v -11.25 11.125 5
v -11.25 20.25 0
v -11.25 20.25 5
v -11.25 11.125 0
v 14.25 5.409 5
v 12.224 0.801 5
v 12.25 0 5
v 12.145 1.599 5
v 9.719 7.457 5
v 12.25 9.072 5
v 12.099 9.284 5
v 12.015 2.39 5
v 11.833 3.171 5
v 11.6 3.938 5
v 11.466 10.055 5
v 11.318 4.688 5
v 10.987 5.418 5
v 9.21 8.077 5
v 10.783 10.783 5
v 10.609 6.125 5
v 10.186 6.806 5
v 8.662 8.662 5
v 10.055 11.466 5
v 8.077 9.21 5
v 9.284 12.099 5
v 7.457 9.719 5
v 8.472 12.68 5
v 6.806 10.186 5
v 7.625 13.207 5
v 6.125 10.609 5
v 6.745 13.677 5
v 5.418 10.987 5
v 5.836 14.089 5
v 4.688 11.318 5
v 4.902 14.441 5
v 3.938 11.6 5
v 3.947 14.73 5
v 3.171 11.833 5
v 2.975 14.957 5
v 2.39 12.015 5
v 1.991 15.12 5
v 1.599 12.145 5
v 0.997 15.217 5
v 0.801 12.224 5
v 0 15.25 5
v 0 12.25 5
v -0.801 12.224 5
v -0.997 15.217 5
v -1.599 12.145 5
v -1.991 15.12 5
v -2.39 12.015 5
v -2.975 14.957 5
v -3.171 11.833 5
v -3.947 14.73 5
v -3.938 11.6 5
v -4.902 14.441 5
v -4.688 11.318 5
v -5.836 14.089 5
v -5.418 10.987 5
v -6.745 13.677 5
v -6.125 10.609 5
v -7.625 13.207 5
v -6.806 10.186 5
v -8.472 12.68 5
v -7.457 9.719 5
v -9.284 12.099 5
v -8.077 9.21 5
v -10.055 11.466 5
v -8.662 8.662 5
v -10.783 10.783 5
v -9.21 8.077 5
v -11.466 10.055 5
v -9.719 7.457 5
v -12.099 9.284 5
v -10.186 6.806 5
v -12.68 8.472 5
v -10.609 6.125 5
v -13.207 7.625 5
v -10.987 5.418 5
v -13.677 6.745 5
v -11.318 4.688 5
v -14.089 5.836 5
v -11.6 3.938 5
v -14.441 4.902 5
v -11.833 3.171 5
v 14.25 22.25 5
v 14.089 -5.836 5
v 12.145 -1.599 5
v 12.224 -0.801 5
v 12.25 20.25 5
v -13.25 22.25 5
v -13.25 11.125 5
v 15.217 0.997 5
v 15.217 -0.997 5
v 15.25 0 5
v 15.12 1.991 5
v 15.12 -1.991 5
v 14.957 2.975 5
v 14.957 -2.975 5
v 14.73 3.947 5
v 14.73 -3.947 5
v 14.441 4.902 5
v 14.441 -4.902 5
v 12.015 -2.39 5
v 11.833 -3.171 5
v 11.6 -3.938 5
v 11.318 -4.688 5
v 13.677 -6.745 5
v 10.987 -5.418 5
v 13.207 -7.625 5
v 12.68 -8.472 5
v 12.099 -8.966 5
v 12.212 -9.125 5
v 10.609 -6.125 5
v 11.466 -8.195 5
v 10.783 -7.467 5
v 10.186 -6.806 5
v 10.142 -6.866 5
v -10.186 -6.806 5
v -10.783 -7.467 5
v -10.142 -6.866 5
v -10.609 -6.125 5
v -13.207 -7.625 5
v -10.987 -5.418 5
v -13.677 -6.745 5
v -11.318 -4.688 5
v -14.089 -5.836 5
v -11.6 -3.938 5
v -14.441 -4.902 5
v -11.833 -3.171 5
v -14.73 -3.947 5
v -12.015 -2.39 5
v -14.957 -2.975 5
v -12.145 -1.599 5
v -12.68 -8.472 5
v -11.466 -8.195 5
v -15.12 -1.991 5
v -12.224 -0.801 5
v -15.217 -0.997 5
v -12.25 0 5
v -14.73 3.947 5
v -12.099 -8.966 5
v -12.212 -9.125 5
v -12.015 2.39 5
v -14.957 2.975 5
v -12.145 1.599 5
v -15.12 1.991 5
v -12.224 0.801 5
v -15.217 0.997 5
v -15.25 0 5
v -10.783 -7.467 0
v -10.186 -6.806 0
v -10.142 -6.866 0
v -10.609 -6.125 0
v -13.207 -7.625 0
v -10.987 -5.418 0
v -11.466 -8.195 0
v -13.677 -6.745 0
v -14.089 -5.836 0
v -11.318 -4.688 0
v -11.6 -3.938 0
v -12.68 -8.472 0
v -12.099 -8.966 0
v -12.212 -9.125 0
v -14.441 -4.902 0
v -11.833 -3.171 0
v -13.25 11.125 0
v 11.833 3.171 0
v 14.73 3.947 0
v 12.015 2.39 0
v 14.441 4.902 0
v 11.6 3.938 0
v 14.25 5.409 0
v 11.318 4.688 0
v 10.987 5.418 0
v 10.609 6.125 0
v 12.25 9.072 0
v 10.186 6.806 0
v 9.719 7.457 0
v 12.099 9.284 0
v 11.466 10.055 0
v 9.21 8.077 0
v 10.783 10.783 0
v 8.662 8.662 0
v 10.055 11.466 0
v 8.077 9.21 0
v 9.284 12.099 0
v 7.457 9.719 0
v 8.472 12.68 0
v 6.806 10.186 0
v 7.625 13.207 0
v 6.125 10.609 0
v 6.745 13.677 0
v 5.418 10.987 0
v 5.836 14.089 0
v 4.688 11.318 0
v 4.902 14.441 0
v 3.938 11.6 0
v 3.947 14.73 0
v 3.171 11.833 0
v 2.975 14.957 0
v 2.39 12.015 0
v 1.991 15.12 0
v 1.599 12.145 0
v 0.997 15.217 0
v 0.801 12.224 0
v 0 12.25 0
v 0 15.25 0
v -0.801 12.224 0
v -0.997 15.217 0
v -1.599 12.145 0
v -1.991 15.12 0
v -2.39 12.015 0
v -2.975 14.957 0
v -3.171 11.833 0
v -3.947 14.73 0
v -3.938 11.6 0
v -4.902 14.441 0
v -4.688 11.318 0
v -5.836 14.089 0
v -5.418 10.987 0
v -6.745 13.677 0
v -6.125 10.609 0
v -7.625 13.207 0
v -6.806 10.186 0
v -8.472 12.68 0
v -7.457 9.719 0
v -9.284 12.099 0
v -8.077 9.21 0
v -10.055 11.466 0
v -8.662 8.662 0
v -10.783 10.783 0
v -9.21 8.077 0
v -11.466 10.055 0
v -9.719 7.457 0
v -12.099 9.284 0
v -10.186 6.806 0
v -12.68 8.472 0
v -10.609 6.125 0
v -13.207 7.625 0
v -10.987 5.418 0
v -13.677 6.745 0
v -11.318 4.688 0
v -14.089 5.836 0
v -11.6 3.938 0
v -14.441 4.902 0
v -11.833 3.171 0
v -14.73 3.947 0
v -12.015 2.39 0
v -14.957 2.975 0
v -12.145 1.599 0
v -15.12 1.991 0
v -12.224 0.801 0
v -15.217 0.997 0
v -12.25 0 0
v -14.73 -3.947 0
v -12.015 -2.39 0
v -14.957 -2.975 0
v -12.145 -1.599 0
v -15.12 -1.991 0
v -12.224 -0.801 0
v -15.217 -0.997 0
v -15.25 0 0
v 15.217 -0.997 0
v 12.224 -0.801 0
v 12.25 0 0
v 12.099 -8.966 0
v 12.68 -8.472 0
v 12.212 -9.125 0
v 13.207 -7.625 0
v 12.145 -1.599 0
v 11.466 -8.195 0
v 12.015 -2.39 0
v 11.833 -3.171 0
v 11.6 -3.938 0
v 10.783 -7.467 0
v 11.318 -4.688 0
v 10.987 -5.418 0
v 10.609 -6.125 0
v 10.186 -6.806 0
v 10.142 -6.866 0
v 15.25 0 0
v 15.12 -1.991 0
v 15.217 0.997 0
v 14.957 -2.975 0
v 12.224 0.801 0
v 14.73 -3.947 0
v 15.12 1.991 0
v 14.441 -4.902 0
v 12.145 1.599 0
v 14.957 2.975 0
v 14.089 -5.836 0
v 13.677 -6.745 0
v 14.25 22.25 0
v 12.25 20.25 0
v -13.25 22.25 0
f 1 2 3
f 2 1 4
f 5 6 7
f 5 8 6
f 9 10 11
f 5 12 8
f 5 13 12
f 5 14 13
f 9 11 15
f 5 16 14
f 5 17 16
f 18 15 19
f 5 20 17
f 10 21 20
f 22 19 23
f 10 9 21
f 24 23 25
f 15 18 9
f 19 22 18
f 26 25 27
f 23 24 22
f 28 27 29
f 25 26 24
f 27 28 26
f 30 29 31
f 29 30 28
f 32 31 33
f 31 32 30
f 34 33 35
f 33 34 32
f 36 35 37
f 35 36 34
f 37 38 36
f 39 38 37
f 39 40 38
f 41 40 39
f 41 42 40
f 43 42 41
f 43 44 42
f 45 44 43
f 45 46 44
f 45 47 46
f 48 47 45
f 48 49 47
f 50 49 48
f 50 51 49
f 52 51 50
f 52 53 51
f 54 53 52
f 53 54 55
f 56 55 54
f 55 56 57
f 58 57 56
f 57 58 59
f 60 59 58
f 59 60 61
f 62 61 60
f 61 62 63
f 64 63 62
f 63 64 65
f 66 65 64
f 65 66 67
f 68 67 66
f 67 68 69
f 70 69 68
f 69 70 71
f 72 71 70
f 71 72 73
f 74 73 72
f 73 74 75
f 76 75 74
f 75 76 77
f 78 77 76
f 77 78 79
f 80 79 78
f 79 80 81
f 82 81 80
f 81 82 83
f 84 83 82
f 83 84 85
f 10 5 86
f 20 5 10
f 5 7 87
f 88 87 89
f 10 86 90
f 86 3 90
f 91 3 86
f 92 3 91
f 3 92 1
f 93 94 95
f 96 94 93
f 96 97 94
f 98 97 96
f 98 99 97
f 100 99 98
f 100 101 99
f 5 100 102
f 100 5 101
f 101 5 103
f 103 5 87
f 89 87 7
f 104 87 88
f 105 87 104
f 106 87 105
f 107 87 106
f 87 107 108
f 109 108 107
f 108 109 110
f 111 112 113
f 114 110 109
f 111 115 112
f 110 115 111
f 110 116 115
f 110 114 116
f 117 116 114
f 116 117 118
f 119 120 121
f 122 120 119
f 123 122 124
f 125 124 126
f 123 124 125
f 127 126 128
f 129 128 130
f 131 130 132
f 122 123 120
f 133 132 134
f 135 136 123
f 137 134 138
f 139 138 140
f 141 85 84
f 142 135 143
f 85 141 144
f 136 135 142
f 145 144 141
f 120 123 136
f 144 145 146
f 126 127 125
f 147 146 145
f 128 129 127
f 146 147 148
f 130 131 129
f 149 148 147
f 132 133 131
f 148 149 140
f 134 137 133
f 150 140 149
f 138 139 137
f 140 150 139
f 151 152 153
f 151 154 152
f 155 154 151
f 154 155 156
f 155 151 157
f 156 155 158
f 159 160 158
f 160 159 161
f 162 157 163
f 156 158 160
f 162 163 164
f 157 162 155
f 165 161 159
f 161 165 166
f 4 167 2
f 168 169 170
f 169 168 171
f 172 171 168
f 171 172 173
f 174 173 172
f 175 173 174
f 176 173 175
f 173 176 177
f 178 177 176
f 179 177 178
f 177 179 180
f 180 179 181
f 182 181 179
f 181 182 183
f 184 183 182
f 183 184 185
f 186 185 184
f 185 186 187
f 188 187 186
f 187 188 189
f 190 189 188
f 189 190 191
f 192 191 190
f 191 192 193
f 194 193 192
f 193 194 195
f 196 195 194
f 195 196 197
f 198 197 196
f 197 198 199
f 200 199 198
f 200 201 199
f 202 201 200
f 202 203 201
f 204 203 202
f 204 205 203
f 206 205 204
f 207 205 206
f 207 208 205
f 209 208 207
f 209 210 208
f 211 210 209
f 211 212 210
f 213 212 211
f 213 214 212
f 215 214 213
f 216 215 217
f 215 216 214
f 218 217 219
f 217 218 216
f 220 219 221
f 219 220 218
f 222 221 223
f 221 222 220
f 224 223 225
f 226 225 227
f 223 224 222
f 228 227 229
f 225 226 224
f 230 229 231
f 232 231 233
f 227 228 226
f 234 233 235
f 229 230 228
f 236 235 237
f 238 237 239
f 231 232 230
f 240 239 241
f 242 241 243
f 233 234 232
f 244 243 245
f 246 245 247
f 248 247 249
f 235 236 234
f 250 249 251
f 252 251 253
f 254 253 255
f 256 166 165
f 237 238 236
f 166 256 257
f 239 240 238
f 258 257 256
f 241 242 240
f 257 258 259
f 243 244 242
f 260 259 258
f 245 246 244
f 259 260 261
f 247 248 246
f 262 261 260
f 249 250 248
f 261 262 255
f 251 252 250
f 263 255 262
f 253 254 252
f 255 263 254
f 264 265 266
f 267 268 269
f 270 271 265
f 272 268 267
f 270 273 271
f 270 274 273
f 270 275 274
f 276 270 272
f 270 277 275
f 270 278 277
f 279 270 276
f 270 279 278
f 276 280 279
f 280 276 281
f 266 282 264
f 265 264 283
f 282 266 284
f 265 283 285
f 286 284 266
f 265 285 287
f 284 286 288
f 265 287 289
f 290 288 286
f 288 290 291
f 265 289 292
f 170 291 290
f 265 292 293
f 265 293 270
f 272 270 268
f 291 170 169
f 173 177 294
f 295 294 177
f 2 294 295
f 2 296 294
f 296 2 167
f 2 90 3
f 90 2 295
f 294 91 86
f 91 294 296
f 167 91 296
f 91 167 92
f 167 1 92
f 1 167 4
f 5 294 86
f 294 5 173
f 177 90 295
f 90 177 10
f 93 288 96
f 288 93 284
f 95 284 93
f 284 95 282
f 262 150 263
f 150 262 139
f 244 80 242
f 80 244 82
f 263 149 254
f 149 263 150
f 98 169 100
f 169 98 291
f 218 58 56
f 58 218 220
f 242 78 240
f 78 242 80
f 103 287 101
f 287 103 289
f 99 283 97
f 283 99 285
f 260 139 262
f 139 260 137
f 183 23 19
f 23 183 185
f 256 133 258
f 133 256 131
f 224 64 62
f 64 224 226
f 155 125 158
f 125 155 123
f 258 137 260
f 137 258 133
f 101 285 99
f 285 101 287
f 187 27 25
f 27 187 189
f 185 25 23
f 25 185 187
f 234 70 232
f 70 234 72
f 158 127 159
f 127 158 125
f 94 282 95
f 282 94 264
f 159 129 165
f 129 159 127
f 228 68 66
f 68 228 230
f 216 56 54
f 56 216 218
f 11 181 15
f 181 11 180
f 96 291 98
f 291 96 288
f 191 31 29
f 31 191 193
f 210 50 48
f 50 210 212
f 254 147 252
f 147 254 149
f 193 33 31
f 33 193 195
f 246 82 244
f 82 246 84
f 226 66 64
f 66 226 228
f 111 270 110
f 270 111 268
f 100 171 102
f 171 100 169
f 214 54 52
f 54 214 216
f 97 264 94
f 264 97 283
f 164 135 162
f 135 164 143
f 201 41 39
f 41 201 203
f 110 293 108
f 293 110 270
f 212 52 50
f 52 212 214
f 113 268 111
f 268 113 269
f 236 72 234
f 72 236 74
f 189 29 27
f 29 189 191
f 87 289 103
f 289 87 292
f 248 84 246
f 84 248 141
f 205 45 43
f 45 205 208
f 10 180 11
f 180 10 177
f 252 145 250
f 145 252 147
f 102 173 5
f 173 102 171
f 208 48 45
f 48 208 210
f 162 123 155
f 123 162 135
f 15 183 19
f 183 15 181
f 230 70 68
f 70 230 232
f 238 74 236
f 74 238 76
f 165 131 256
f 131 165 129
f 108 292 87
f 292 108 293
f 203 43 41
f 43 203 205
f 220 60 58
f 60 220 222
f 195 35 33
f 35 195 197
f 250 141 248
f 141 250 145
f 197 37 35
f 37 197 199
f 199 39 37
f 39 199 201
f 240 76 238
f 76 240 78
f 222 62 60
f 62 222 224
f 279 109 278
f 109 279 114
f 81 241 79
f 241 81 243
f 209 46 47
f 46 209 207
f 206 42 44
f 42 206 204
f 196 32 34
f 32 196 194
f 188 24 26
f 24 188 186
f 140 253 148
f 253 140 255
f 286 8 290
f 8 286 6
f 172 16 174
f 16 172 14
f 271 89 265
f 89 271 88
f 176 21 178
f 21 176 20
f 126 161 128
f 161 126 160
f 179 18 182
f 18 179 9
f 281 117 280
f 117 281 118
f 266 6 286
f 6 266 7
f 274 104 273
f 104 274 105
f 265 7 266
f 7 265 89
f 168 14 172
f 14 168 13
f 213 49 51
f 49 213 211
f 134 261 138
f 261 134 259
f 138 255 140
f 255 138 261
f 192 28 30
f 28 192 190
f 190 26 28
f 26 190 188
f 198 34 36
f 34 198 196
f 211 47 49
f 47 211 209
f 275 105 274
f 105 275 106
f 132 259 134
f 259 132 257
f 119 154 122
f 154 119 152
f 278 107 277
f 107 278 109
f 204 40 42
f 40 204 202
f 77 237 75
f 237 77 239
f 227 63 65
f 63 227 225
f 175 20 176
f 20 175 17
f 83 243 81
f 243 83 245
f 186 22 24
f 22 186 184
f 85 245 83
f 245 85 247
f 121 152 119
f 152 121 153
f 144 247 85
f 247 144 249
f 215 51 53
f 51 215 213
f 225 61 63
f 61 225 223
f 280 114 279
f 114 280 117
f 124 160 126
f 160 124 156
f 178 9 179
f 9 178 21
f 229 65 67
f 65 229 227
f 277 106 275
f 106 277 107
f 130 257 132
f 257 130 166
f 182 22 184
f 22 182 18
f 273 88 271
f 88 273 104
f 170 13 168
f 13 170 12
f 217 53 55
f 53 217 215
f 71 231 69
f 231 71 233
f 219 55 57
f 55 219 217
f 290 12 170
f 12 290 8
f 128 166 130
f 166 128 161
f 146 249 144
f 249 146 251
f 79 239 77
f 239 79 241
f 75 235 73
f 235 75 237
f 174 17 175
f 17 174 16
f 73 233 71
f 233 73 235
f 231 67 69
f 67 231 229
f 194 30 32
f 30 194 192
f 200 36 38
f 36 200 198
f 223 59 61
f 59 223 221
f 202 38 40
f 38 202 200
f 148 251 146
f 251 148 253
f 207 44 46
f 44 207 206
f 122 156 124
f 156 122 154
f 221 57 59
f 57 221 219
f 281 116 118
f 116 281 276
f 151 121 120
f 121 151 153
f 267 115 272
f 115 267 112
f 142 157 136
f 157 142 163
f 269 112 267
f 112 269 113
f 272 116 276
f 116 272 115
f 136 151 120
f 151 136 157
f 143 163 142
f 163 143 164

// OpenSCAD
pole_dia = 24.5;
pole_r = pole_dia/2;
pole_thick = 3;
pole_h = 5;
clip_depth = 10;
clip_thick = 2;

$fn = 96;

clip_depth2 = clip_depth + pole_r;

difference (){

  union(){
    translate([pole_r, 0, 0]){
      cube([clip_thick, clip_depth2, pole_h]);
      
      translate([0+1, clip_depth2, 0]){
        rotate(a=180, v=[0,0,1]){
          cube([(pole_r*2), clip_thick, pole_h]);
          
          translate([(pole_r*2), 0, 0]){
            cube([clip_thick, clip_depth2/2, pole_h]);
          }
        }
      }      
    }
    
    cylinder(r=pole_r+pole_thick, h=pole_h);
  }

  translate([0, 0, 0-(pole_h*0.1) ]){
    cylinder(r=pole_r, h=pole_h*1.2);
    
    translate([0, 0-pole_r-(pole_thick*2), 0])
      cylinder(r=pole_r+pole_thick, h=pole_h*1.2);
  }
}
